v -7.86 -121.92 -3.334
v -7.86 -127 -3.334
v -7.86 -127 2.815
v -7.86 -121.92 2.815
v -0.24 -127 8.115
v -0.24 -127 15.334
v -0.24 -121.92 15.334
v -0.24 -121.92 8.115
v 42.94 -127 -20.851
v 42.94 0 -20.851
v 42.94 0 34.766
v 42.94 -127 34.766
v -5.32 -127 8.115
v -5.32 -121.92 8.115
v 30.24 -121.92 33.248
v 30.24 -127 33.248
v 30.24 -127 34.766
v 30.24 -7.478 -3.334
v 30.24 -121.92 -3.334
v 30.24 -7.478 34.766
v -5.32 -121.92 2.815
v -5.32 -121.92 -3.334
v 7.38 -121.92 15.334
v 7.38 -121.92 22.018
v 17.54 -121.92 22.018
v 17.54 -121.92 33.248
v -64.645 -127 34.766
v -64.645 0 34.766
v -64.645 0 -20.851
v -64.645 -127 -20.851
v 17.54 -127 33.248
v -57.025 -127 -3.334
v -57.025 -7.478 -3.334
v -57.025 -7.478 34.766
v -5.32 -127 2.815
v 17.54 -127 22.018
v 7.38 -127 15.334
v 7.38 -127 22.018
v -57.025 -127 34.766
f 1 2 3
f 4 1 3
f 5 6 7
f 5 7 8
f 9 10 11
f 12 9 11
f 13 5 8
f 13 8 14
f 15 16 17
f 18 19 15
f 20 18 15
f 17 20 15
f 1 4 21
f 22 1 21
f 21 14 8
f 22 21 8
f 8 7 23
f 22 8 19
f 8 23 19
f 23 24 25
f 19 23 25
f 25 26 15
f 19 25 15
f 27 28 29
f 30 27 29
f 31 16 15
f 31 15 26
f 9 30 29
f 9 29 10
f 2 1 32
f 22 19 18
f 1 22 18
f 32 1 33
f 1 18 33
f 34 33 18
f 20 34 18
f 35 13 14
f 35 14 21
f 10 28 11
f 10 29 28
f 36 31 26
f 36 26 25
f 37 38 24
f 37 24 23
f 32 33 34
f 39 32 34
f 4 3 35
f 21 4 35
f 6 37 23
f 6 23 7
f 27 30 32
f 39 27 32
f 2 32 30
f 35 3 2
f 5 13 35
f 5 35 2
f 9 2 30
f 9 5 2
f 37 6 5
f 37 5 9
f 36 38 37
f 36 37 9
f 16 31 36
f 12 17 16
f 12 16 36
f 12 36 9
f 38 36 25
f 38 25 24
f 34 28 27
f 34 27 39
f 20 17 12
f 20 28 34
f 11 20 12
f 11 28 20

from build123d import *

# Parameters (mm, degrees)
F0_W     = 7.62
F0_H     = 38.1
F0_W_2   = 12.7
F1_DEPTH = 127
F2_W     = 87.2650571496
F2_H     = 7.4778180569
F3_DEPTH = 38.1
F5_W     = 2.54
F5_H     = 6.1494747632
F6_DEPTH = 5.08


with BuildPart() as f1:
    # F0 (on Front) → F1 (new body)
    with BuildSketch(Plane.XZ):
        Polygon((-64.6448548068, -3.3340927702), (-64.6448548068, -20.8513359327), (42.9402023428, -20.8513359327), (42.9402023428, -3.3340927702), (30.2402023428, -3.3340927702), (-57.0248548068, -3.3340927702), align=None)
        with Locations((-60.8348548068, 15.7159072298)):
            Rectangle(F0_W, F0_H)
        with Locations((36.5902023428, 15.7159072298)):
            Rectangle(F0_W_2, F0_H)
    extrude(amount=F1_DEPTH)

    # F2 (on face) → F3 (join)
    with BuildSketch(Plane.XY.offset(-3.3340927702)):
        with Locations((-13.392326232, -3.7389090285)):
            Rectangle(F2_W, F2_H)
    extrude(amount=F3_DEPTH)

    # F5 (on face) → F6 (join)
    with BuildSketch(Plane.XZ.offset(127)):
        Polygon((30.2402023428, -3.3340927702), (30.2402023428, 33.2476731723), (17.5402023428, 33.2476731723), (17.5402023428, 22.0181959489), (17.5402023428, -3.3340927702), align=None)
        Polygon((17.5402023428, -3.3340927702), (17.5402023428, 22.0181959489), (7.3802023428, 22.0181959489), (7.3802023428, 15.3339850341), (7.3802023428, -3.3340927702), align=None)
        Polygon((-0.2397976572, -3.3340927702), (7.3802023428, -3.3340927702), (7.3802023428, 15.3339850341), (-0.2397976572, 15.3339850341), (-0.2397976572, 8.1150363277), align=None)
        Polygon((-5.3197976572, -3.3340927702), (-0.2397976572, -3.3340927702), (-0.2397976572, 8.1150363277), (-5.3197976572, 8.1150363277), (-5.3197976572, 2.8153819931), align=None)
        with Locations((-6.5897976572, -0.2593553885)):
            Rectangle(F5_W, F5_H)
    extrude(amount=-F6_DEPTH)


solid = f1.part
